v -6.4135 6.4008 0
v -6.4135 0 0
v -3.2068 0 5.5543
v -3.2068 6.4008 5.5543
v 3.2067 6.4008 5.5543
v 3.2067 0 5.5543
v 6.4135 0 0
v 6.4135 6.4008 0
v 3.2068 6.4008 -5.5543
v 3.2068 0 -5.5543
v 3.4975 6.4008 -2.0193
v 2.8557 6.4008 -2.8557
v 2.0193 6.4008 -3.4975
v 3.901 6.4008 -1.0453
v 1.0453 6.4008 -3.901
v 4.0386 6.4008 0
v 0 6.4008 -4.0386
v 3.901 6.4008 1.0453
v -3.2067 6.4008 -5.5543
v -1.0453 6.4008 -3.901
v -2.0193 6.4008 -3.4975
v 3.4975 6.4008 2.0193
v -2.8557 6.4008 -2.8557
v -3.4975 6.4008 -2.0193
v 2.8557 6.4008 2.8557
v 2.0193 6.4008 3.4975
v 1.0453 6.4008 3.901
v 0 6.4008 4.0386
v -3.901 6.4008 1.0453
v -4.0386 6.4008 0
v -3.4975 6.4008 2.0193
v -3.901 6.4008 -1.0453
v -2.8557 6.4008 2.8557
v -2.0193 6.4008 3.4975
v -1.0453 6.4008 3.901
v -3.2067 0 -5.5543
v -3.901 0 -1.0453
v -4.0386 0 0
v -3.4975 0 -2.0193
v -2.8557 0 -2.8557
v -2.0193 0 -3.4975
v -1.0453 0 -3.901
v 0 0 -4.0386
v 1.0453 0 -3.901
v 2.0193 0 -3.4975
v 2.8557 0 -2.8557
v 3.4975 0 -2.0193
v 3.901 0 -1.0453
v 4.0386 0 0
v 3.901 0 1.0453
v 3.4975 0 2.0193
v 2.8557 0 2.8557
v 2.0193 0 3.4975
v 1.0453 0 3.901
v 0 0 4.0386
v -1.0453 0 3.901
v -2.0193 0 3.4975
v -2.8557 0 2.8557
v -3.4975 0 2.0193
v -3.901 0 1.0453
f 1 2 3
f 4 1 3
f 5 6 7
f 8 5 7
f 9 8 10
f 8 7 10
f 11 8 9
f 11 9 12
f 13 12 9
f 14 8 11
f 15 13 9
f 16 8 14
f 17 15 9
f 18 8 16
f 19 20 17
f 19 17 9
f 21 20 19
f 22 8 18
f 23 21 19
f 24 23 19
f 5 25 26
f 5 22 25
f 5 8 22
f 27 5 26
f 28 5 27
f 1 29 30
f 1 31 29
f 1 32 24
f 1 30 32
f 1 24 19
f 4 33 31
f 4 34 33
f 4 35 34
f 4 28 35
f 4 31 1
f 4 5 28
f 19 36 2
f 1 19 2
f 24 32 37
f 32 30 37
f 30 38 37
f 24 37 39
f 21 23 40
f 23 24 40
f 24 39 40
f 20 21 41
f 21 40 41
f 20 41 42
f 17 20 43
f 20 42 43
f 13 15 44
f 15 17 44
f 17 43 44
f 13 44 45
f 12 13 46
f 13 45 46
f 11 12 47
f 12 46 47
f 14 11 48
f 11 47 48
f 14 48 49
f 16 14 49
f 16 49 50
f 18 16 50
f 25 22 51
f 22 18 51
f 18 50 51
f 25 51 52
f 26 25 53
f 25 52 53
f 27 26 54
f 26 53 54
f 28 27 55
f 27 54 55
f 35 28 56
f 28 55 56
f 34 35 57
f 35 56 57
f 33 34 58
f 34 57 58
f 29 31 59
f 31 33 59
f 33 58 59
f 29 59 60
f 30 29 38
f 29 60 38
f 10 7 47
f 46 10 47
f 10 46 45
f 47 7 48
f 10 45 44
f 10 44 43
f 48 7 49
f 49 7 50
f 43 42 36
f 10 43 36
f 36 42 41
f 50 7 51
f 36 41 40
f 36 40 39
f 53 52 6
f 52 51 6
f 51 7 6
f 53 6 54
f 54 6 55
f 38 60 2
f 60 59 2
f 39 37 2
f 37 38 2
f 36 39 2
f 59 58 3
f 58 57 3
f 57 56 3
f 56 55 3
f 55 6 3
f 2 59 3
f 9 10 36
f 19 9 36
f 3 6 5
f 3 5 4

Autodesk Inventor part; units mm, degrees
ref_plane "YZ Plane" through (0, 0, 0) normal (1, 0, 0) x (0, 1, 0)
ref_plane "XZ Plane" through (0, 0, 0) normal (0, 1, 0) x (-1, 0, 0)
ref_plane "XY Plane" through (0, 0, 0) normal (0, 0, 1) x (1, 0, 0)
sketch "Sketch1" plane through (0, 0, 0) normal (0, 1, 0) x (-1, 0, 0)
  circle A0 centre (0, 0) radius 6.4135 construction
  line L0 (-3.2067, 5.5543) -> (3.2068, 5.5543)
  line L1 (-3.2067, 5.5543) -> (-6.4135, 0)
  line L2 (-6.4135, 0) -> (-3.2068, -5.5543)
  line L3 (-3.2068, -5.5543) -> (3.2067, -5.5543)
  line L4 (3.2067, -5.5543) -> (6.4135, 0)
  line L5 (6.4135, 0) -> (3.2068, 5.5543)
  circle A1 centre (0, 0) radius 4.0386
  dimension "d0" = 12.827
  dimension "d1" = 8.0772
extrude "Extrusion1" add sketch "Sketch1" along normal blind 6.4008
properties part number "denso-gates-15 spacer"
